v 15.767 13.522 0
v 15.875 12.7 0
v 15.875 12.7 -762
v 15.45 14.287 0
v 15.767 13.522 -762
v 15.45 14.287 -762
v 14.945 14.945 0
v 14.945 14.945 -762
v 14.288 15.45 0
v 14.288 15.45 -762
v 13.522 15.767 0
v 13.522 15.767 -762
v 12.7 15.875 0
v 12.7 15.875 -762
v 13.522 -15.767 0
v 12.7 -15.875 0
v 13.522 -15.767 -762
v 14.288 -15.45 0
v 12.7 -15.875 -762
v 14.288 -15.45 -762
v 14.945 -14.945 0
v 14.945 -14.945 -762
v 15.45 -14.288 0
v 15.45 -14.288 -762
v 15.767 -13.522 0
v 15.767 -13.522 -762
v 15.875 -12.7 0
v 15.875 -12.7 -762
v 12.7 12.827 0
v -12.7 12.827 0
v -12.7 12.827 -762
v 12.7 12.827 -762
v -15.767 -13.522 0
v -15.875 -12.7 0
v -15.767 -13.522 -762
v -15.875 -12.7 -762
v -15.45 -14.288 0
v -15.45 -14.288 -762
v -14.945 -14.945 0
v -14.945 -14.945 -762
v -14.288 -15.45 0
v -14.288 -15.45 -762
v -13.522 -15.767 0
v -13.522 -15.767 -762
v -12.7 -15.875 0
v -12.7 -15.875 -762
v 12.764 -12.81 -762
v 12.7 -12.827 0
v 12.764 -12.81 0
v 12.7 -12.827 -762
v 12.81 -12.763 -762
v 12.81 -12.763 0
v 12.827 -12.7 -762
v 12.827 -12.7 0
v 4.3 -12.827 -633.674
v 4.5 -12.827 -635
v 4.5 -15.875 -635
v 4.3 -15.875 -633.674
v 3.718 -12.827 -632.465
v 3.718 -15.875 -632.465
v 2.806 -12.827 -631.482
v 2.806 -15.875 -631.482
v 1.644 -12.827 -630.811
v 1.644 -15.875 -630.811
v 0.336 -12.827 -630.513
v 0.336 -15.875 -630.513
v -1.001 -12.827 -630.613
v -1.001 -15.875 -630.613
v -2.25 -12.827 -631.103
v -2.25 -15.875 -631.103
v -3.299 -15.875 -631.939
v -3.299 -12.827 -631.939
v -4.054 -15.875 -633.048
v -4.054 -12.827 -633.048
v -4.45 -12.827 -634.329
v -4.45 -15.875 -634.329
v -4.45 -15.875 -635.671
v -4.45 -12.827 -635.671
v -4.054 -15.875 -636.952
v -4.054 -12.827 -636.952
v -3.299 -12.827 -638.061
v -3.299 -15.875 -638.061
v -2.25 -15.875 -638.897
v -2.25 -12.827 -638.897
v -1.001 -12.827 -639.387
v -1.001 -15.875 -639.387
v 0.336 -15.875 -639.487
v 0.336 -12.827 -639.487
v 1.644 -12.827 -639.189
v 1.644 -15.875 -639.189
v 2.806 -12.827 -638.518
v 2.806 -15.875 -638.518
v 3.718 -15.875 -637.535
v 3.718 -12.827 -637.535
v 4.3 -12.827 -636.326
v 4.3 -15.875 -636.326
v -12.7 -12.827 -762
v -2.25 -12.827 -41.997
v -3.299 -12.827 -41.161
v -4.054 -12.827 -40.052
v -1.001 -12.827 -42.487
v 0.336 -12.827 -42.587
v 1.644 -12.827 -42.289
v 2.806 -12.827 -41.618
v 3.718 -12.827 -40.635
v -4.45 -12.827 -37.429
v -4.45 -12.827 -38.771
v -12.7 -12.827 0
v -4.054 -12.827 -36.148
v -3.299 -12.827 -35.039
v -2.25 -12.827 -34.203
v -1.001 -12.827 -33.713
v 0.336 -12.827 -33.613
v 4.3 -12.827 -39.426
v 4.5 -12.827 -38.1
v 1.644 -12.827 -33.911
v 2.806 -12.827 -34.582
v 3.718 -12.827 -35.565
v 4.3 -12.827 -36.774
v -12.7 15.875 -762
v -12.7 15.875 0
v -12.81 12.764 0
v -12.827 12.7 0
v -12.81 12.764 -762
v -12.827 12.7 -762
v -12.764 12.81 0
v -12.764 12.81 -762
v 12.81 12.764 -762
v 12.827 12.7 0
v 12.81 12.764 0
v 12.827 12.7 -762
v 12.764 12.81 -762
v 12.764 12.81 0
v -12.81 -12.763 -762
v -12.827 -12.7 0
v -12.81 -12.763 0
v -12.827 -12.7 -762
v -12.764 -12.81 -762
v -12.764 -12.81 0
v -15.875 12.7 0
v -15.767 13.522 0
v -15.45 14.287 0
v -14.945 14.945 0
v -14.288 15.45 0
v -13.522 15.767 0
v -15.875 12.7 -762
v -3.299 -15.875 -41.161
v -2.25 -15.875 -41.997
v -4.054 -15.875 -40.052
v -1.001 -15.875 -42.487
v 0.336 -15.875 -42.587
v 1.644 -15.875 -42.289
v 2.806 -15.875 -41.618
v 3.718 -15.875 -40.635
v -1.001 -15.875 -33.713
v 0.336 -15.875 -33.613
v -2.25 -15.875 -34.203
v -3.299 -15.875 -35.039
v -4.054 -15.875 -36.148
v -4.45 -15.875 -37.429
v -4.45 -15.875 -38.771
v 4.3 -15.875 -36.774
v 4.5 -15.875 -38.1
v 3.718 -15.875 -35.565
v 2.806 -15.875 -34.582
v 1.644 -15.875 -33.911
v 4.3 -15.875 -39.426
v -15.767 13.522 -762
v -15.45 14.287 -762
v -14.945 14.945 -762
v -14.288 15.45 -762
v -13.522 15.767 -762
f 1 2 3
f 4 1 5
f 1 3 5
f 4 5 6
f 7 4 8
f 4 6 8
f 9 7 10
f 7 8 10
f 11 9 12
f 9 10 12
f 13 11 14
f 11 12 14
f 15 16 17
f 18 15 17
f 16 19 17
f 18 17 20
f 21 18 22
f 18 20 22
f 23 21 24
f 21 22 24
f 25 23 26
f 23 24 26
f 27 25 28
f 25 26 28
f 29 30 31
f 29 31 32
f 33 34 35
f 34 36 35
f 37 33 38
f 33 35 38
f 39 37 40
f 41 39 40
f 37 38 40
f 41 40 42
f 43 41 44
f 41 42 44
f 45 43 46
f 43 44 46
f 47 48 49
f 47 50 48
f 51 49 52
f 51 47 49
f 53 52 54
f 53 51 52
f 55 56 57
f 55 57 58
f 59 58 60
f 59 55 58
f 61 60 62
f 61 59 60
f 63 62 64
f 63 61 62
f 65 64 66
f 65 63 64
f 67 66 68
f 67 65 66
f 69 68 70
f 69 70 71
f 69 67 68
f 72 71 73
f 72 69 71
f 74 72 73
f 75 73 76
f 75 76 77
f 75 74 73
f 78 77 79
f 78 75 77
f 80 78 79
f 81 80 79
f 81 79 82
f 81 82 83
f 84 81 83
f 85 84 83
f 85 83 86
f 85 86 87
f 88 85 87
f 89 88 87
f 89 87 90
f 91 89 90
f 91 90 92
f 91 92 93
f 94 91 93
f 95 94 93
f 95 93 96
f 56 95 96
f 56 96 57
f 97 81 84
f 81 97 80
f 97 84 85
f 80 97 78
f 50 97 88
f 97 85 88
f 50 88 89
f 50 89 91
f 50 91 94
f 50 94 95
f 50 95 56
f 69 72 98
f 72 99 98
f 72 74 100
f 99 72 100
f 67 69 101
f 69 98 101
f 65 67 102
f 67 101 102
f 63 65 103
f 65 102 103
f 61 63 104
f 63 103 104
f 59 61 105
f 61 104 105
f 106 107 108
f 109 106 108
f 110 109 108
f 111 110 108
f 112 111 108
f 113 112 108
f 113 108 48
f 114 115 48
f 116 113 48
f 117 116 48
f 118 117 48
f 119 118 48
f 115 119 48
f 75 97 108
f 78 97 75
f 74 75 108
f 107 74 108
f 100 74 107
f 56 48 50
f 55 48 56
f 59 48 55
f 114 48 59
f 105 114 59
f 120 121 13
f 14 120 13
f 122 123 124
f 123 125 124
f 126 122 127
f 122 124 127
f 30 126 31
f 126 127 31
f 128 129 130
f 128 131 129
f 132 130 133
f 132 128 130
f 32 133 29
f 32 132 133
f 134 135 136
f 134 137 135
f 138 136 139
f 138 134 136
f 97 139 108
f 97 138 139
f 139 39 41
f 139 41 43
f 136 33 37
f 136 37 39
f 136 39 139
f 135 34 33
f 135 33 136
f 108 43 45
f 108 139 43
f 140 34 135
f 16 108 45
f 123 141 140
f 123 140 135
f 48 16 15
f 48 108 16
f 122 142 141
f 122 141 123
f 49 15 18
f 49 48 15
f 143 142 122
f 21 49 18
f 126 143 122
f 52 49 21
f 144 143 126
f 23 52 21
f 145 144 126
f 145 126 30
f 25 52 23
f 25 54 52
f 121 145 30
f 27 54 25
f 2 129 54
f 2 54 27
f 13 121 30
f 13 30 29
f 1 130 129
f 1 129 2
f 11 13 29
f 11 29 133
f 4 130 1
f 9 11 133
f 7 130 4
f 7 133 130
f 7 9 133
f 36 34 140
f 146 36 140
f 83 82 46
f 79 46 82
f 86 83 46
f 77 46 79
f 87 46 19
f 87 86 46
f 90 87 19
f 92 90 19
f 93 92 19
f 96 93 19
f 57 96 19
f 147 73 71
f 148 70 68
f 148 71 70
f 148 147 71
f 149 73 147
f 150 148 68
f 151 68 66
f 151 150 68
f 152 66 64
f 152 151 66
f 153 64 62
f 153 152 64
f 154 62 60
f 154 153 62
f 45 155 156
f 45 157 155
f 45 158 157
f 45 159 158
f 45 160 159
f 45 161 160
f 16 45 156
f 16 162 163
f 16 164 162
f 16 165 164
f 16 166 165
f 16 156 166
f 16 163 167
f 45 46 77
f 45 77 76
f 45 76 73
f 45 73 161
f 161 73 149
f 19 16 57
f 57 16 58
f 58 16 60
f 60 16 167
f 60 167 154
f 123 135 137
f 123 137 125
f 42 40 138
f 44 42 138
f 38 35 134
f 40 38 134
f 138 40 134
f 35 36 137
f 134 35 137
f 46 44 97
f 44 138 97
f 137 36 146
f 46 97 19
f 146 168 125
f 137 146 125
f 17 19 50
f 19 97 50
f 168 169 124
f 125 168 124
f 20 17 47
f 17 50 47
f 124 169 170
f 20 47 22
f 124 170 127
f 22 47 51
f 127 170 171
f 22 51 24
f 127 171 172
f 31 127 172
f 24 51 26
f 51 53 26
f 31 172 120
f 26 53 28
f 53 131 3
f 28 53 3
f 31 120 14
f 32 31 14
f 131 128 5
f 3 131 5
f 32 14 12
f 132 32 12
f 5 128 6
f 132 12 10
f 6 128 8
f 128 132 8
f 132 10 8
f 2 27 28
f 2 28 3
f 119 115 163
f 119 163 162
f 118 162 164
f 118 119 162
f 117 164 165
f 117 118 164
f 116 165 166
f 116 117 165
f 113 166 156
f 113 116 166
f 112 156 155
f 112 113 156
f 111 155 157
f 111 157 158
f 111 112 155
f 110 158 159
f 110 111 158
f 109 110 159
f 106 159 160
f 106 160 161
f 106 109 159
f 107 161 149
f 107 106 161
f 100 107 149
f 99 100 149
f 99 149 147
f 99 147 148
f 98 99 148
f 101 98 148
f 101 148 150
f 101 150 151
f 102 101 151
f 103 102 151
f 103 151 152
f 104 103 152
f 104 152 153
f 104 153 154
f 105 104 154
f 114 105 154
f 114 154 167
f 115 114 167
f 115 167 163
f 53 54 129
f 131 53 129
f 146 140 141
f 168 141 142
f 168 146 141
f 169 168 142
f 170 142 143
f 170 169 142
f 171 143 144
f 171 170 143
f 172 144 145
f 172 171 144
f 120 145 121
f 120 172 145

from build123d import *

# Parameters (mm, degrees)
F0_W     = 31.75
F0_H     = 31.75
F1_DEPTH = 762
F2_R     = 3.175
F3_T     = -3.048
F4_R     = 4.5
F5_DEPTH = 15.875


with BuildPart() as f1:
    # F0 (on Top) → F1 (new body)
    with BuildSketch(Plane.XY):
        Rectangle(F0_W, F0_H)
    extrude(amount=-F1_DEPTH)

    # F2
    f2_edges = [f1.edges().sort_by_distance(p)[0] for p in [
        (-15.875, 15.875, -381),
        (-15.875, -15.875, -381),
        (15.875, 15.875, -381),
        (15.875, -15.875, -381),
    ]]
    fillet(f2_edges, radius=F2_R)

    # F3
    f3_openings = [f1.faces().sort_by_distance(p)[0] for p in [
        (0, 0, 0),
        (0, 0, -762),
    ]]
    offset(amount=F3_T, openings=f3_openings)

    # F4 (on Front) → F5 (cut, through all)
    with BuildSketch(Plane.XZ):
        with Locations((0, -38.1)):
            Circle(F4_R)
        with Locations((0, -635)):
            Circle(F4_R)
    extrude(amount=F5_DEPTH, mode=Mode.SUBTRACT)


solid = f1.part
